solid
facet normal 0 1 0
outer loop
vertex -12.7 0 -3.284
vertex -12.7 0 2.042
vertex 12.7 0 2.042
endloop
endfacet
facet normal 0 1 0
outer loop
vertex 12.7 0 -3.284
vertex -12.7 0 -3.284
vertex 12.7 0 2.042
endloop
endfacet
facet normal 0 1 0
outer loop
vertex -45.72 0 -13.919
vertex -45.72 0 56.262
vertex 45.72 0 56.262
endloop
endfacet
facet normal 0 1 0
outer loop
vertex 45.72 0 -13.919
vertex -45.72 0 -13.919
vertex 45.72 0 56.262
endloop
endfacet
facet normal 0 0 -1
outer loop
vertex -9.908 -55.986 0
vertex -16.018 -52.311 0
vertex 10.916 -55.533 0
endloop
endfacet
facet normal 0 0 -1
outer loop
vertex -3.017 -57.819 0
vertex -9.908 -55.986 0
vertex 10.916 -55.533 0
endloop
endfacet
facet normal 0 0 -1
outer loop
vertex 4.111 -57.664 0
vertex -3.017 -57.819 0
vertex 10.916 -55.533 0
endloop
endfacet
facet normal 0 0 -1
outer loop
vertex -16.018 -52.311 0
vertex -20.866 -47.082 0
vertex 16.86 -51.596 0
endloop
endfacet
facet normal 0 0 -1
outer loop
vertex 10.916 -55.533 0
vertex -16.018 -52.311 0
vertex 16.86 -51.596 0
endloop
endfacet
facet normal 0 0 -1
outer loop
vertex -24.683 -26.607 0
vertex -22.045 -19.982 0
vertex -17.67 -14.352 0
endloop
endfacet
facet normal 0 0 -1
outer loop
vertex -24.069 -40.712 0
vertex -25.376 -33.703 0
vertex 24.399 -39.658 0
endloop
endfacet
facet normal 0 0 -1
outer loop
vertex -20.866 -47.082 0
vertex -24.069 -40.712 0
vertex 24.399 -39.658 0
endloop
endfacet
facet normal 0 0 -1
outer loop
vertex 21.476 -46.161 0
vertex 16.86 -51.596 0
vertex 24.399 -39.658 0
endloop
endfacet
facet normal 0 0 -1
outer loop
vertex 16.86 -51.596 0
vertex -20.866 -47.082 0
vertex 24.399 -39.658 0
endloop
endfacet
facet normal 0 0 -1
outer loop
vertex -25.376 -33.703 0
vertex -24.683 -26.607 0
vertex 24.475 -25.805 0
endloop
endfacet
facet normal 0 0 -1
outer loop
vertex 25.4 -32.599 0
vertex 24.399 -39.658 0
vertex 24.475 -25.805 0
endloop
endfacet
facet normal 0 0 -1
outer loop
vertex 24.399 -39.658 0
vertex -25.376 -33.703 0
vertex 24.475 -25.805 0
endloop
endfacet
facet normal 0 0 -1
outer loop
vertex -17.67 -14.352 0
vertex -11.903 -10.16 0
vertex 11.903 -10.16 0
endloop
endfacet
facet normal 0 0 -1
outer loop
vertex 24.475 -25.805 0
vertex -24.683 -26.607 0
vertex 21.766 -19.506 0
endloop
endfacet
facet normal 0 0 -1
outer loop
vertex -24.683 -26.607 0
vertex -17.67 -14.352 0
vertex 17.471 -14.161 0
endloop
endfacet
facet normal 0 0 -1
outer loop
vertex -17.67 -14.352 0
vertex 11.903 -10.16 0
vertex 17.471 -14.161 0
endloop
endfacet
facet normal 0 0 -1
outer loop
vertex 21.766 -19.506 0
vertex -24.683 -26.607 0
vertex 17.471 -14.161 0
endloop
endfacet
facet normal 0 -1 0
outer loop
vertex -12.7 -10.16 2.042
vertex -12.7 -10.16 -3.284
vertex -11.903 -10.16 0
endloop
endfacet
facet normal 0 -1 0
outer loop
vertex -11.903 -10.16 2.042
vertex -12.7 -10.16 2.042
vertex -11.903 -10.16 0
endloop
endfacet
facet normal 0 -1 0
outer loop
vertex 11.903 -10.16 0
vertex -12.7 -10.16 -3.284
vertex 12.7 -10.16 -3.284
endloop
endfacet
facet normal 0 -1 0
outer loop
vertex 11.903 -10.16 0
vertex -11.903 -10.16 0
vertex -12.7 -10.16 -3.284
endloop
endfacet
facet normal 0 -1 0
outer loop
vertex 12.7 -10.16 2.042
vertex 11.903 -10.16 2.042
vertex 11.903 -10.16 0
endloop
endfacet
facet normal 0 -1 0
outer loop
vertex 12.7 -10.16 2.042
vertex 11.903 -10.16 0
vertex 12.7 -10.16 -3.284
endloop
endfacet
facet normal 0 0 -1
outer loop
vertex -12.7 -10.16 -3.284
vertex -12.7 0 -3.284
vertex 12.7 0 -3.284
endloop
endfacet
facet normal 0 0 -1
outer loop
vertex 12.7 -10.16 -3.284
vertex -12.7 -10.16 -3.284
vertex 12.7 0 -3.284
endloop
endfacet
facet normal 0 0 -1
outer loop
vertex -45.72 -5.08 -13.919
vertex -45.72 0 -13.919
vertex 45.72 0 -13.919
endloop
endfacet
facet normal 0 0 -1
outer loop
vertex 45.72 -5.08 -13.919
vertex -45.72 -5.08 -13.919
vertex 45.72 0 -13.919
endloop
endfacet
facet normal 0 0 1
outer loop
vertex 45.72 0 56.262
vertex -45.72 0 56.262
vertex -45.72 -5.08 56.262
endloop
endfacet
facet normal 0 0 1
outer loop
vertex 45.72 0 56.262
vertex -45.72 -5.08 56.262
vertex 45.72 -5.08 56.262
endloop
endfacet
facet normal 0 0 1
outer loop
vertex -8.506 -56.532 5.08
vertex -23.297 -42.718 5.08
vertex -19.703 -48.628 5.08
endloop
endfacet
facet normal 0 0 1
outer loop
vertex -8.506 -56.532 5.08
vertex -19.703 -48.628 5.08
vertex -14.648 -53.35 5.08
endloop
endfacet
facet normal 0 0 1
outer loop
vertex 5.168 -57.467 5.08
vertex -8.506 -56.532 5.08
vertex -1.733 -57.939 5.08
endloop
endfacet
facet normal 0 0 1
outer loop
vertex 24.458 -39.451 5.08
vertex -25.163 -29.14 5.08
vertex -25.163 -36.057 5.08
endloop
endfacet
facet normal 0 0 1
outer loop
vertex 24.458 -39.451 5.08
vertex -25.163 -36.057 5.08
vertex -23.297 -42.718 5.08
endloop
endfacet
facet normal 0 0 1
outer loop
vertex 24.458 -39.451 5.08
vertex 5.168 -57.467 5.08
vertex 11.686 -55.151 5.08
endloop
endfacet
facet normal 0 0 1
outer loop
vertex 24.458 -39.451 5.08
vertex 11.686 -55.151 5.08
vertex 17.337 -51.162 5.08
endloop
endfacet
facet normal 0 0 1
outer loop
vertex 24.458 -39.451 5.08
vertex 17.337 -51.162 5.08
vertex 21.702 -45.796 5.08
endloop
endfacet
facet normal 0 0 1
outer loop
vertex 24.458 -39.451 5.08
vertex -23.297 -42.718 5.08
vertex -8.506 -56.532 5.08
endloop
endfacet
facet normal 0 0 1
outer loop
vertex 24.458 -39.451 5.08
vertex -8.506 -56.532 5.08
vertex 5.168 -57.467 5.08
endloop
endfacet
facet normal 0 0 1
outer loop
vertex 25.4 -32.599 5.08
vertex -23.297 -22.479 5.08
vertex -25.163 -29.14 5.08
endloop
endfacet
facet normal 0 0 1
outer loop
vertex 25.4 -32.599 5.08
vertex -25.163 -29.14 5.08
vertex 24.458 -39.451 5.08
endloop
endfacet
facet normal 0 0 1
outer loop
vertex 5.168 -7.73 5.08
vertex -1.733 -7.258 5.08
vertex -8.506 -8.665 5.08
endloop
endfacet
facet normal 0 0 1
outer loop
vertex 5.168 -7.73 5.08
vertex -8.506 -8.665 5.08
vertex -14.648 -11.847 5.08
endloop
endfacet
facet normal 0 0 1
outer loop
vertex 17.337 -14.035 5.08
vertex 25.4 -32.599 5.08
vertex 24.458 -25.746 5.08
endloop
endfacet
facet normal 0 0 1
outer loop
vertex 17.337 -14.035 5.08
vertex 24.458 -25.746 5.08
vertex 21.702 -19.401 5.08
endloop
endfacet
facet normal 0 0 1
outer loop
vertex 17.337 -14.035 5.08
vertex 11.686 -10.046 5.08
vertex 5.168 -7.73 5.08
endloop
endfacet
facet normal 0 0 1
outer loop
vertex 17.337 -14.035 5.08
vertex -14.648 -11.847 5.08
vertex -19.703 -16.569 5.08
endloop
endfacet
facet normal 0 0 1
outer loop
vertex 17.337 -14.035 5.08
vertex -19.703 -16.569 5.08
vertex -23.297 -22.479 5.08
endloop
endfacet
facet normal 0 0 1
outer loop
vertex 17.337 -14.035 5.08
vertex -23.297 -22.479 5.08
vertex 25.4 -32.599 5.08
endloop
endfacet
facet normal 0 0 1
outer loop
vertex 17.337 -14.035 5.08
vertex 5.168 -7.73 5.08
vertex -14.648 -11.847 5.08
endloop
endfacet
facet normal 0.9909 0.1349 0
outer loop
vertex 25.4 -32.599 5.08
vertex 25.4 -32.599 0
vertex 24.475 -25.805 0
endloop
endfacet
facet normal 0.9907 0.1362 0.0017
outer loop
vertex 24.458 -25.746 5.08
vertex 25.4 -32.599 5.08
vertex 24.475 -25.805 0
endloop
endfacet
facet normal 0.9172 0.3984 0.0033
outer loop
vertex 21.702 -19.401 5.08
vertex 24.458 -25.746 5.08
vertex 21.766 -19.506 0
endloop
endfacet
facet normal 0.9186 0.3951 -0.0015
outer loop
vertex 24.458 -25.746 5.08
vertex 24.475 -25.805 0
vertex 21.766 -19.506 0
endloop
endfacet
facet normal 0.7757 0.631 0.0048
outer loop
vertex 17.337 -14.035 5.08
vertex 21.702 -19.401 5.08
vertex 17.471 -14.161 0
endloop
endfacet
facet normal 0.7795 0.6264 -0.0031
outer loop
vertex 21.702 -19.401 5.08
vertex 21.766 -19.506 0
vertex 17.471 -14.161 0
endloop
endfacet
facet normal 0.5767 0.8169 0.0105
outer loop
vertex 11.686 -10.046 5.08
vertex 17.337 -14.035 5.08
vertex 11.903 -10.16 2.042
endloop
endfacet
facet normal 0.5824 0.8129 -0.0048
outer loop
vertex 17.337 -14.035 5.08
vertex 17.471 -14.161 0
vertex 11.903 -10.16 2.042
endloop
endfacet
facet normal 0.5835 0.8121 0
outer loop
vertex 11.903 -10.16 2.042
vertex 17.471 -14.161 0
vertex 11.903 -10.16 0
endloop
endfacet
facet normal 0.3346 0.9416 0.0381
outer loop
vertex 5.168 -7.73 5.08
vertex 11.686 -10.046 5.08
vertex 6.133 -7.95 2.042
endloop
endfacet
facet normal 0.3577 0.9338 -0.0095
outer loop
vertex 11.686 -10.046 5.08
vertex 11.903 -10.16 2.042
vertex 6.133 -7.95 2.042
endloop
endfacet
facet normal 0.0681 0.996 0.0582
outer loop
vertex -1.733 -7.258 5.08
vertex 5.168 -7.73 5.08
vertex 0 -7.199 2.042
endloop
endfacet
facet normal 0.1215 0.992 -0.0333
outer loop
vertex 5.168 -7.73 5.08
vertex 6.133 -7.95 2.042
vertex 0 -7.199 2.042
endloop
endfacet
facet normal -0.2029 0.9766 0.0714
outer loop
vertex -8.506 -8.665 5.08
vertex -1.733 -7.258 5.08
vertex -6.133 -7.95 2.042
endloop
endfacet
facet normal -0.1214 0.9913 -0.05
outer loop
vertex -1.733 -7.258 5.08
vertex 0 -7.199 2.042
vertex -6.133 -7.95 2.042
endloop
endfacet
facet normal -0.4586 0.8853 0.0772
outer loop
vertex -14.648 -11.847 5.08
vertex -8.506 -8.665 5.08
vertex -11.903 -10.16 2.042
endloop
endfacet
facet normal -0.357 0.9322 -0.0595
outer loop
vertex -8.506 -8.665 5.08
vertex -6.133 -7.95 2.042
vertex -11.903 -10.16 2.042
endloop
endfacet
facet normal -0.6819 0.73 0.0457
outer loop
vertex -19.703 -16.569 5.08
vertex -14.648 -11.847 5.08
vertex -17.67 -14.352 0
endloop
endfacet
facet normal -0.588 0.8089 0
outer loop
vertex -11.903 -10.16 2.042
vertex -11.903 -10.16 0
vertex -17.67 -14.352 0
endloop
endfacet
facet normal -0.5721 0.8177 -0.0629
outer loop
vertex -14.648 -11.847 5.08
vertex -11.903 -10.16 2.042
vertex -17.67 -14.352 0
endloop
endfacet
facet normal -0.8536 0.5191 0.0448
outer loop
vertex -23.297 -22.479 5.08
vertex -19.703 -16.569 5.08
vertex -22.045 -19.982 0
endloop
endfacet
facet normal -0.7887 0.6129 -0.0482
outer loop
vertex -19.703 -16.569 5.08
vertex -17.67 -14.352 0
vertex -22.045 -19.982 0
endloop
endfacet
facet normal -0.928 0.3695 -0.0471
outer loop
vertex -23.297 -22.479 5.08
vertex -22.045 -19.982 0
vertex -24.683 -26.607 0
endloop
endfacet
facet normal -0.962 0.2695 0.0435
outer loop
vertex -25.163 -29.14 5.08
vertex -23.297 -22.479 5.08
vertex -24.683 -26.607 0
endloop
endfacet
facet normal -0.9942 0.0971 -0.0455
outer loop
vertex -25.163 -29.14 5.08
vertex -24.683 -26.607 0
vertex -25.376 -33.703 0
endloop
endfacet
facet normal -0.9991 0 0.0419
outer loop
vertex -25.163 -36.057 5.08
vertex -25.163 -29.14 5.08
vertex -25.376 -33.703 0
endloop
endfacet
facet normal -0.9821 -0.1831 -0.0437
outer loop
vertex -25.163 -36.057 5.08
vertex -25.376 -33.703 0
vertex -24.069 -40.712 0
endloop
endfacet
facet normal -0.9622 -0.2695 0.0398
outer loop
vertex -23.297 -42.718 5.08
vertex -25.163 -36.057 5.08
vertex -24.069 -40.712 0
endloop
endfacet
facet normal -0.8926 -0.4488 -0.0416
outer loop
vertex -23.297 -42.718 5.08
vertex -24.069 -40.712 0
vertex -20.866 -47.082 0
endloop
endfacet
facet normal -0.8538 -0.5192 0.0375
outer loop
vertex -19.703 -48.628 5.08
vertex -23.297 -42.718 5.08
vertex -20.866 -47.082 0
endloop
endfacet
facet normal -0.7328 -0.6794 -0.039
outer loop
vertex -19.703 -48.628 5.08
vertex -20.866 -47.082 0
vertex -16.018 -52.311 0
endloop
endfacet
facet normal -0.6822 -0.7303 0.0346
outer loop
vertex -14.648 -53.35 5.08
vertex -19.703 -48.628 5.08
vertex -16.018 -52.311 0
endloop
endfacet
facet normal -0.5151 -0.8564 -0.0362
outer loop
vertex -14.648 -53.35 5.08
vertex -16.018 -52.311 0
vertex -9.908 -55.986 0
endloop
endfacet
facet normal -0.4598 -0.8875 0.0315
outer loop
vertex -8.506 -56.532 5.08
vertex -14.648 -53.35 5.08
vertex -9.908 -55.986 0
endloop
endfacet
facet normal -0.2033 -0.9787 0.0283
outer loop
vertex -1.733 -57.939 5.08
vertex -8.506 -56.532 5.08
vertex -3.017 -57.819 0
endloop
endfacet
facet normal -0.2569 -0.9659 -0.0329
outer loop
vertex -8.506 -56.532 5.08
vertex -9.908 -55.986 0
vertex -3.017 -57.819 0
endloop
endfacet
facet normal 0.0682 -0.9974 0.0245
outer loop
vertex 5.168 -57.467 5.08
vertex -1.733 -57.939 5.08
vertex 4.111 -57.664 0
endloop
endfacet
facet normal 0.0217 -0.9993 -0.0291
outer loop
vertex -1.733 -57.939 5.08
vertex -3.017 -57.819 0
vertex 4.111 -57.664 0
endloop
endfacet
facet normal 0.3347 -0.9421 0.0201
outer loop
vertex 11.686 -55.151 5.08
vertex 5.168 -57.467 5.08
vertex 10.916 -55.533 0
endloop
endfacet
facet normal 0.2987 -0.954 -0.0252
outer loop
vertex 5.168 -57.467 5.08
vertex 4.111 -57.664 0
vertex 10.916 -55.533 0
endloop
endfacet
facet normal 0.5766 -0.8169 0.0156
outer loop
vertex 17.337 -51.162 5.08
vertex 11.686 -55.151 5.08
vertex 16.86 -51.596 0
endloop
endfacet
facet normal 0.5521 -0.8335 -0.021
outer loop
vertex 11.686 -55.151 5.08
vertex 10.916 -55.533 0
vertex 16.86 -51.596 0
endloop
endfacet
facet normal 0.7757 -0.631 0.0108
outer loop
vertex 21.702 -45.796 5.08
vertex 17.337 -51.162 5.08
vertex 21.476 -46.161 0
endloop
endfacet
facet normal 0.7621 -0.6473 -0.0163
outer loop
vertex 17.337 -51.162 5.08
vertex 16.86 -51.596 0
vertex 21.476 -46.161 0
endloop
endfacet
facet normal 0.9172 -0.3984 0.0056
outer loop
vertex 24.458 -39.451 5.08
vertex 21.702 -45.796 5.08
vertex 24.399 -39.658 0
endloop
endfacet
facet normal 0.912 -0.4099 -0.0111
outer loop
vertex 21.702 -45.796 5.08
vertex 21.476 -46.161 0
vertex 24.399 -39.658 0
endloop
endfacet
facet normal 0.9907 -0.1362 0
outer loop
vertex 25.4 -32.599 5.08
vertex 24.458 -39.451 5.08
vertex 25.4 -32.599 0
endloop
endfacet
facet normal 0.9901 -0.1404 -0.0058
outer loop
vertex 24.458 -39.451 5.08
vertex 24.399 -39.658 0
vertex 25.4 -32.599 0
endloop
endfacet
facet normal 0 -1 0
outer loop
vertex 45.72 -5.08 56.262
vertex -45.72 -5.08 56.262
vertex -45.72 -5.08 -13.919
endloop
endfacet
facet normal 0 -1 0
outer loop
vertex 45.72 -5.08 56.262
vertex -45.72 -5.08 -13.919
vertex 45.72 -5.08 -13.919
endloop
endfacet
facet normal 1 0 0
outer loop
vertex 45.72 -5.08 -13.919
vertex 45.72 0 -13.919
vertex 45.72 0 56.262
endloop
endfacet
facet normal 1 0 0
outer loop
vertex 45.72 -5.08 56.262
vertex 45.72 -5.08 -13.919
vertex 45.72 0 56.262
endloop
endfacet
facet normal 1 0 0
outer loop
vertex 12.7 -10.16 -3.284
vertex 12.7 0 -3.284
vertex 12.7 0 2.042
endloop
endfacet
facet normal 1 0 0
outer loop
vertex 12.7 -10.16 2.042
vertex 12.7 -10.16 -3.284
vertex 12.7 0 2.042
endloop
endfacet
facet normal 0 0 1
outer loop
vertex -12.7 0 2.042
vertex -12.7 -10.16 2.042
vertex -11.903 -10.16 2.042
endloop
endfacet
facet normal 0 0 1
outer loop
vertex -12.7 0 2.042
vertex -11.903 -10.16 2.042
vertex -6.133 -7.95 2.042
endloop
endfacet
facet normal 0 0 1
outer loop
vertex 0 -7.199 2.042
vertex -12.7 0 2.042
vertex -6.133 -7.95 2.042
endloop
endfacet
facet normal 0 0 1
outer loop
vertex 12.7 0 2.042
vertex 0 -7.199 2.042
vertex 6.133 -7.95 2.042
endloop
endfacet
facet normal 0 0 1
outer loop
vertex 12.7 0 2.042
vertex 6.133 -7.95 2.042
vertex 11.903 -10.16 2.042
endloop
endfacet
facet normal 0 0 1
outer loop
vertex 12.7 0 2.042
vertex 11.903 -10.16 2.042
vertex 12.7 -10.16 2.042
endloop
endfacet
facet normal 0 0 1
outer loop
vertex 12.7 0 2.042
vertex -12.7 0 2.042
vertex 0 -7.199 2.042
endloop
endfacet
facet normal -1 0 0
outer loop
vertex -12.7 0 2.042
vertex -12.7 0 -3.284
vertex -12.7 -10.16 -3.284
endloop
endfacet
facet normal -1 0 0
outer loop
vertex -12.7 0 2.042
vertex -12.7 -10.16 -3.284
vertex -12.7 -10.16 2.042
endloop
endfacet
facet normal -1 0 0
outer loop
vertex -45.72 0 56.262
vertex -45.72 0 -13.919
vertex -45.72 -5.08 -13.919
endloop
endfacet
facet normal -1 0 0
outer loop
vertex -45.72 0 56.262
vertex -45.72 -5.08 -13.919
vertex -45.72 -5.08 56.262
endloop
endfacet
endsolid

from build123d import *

# Parameters (mm, degrees)
F0_W     = 91.44
F0_H     = 70.1808394187
F1_DEPTH = 5.08
F2_W     = 25.4
F2_H     = 5.3267918489
F3_DEPTH = 10.16
F4_R     = 25.4
F5_DEPTH = 5.08
F7_DEPTH = 5.08


with BuildPart() as f1:
    # F0 (on Front) → F1 (new body)
    with BuildSketch(Plane.XZ):
        with Locations((0, 21.1718762293)):
            Rectangle(F0_W, F0_H)
    extrude(amount=F1_DEPTH)

    # F6 (on Top) → F7 (cut)
    with BuildSketch(Plane.XY):
        with BuildLine():
            ThreePointArc((21.8690727222, -32.5756610837), (15.4637696201, -17.1118914636), (0, -10.7065883615))
            Line((0, -10.7065883615), (0, -32.5756610837))
            Line((0, -32.5756610837), (0, -54.4447338059))
            ThreePointArc((0, -54.4447338059), (15.4637696201, -48.0394307038), (21.8690727222, -32.5756610837))
        make_face()
        with BuildLine():
            Line((0, -32.5756610837), (0, -10.7065883615))
            ThreePointArc((0, -10.7065883615), (-21.8690727222, -32.5756610837), (0, -54.4447338059))
            Line((0, -54.4447338059), (0, -32.5756610837))
        make_face()
    extrude(amount=-F7_DEPTH, mode=Mode.SUBTRACT)


with BuildPart() as f3:
    # F2 (on Front) → F3 (new body)
    with BuildSketch(Plane.XZ):
        with Locations((0, -0.6209677085)):
            Rectangle(F2_W, F2_H)
    extrude(amount=F3_DEPTH)

    # F4 (on Top) → F5 (join)
    with BuildSketch(Plane.XY):
        with Locations((0, -32.5985281384)):
            Circle(F4_R)
    extrude(amount=F5_DEPTH)


solid = Compound([f1.part, f3.part])
